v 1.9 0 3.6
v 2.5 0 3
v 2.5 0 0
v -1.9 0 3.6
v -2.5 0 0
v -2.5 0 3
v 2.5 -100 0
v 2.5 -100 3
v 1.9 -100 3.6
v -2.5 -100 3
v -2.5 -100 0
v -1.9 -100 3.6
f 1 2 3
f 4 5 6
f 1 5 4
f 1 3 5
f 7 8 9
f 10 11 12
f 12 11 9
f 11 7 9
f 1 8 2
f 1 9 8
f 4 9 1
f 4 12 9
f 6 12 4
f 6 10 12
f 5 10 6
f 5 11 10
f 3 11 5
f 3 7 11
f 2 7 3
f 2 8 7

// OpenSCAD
$fn = 64;

// Miniature linear guide rail
rail_w = 5.0;     // width (X)
rail_h = 3.6;     // height (Z)
rail_l = 100.0;   // length (Y)

module rail_profile(w, h) {
    // Simple realistic-ish profile: rectangular body with small top chamfers
    cham = min(0.6, w*0.18, h*0.25);

    // 2D profile in X-Z plane, centered on X, bottom at Z=0
    polygon(points=[
        [-w/2, 0],
        [ w/2, 0],
        [ w/2, h-cham],
        [ w/2-cham, h],
        [-w/2+cham, h],
        [-w/2, h-cham]
    ]);
}

module linear_guide_rail(w, h, l) {
    // Extrude along Y
    rotate([90,0,0])
        linear_extrude(height=l, center=false, convexity=10)
            rail_profile(w, h);
}

linear_guide_rail(rail_w, rail_h, rail_l);
